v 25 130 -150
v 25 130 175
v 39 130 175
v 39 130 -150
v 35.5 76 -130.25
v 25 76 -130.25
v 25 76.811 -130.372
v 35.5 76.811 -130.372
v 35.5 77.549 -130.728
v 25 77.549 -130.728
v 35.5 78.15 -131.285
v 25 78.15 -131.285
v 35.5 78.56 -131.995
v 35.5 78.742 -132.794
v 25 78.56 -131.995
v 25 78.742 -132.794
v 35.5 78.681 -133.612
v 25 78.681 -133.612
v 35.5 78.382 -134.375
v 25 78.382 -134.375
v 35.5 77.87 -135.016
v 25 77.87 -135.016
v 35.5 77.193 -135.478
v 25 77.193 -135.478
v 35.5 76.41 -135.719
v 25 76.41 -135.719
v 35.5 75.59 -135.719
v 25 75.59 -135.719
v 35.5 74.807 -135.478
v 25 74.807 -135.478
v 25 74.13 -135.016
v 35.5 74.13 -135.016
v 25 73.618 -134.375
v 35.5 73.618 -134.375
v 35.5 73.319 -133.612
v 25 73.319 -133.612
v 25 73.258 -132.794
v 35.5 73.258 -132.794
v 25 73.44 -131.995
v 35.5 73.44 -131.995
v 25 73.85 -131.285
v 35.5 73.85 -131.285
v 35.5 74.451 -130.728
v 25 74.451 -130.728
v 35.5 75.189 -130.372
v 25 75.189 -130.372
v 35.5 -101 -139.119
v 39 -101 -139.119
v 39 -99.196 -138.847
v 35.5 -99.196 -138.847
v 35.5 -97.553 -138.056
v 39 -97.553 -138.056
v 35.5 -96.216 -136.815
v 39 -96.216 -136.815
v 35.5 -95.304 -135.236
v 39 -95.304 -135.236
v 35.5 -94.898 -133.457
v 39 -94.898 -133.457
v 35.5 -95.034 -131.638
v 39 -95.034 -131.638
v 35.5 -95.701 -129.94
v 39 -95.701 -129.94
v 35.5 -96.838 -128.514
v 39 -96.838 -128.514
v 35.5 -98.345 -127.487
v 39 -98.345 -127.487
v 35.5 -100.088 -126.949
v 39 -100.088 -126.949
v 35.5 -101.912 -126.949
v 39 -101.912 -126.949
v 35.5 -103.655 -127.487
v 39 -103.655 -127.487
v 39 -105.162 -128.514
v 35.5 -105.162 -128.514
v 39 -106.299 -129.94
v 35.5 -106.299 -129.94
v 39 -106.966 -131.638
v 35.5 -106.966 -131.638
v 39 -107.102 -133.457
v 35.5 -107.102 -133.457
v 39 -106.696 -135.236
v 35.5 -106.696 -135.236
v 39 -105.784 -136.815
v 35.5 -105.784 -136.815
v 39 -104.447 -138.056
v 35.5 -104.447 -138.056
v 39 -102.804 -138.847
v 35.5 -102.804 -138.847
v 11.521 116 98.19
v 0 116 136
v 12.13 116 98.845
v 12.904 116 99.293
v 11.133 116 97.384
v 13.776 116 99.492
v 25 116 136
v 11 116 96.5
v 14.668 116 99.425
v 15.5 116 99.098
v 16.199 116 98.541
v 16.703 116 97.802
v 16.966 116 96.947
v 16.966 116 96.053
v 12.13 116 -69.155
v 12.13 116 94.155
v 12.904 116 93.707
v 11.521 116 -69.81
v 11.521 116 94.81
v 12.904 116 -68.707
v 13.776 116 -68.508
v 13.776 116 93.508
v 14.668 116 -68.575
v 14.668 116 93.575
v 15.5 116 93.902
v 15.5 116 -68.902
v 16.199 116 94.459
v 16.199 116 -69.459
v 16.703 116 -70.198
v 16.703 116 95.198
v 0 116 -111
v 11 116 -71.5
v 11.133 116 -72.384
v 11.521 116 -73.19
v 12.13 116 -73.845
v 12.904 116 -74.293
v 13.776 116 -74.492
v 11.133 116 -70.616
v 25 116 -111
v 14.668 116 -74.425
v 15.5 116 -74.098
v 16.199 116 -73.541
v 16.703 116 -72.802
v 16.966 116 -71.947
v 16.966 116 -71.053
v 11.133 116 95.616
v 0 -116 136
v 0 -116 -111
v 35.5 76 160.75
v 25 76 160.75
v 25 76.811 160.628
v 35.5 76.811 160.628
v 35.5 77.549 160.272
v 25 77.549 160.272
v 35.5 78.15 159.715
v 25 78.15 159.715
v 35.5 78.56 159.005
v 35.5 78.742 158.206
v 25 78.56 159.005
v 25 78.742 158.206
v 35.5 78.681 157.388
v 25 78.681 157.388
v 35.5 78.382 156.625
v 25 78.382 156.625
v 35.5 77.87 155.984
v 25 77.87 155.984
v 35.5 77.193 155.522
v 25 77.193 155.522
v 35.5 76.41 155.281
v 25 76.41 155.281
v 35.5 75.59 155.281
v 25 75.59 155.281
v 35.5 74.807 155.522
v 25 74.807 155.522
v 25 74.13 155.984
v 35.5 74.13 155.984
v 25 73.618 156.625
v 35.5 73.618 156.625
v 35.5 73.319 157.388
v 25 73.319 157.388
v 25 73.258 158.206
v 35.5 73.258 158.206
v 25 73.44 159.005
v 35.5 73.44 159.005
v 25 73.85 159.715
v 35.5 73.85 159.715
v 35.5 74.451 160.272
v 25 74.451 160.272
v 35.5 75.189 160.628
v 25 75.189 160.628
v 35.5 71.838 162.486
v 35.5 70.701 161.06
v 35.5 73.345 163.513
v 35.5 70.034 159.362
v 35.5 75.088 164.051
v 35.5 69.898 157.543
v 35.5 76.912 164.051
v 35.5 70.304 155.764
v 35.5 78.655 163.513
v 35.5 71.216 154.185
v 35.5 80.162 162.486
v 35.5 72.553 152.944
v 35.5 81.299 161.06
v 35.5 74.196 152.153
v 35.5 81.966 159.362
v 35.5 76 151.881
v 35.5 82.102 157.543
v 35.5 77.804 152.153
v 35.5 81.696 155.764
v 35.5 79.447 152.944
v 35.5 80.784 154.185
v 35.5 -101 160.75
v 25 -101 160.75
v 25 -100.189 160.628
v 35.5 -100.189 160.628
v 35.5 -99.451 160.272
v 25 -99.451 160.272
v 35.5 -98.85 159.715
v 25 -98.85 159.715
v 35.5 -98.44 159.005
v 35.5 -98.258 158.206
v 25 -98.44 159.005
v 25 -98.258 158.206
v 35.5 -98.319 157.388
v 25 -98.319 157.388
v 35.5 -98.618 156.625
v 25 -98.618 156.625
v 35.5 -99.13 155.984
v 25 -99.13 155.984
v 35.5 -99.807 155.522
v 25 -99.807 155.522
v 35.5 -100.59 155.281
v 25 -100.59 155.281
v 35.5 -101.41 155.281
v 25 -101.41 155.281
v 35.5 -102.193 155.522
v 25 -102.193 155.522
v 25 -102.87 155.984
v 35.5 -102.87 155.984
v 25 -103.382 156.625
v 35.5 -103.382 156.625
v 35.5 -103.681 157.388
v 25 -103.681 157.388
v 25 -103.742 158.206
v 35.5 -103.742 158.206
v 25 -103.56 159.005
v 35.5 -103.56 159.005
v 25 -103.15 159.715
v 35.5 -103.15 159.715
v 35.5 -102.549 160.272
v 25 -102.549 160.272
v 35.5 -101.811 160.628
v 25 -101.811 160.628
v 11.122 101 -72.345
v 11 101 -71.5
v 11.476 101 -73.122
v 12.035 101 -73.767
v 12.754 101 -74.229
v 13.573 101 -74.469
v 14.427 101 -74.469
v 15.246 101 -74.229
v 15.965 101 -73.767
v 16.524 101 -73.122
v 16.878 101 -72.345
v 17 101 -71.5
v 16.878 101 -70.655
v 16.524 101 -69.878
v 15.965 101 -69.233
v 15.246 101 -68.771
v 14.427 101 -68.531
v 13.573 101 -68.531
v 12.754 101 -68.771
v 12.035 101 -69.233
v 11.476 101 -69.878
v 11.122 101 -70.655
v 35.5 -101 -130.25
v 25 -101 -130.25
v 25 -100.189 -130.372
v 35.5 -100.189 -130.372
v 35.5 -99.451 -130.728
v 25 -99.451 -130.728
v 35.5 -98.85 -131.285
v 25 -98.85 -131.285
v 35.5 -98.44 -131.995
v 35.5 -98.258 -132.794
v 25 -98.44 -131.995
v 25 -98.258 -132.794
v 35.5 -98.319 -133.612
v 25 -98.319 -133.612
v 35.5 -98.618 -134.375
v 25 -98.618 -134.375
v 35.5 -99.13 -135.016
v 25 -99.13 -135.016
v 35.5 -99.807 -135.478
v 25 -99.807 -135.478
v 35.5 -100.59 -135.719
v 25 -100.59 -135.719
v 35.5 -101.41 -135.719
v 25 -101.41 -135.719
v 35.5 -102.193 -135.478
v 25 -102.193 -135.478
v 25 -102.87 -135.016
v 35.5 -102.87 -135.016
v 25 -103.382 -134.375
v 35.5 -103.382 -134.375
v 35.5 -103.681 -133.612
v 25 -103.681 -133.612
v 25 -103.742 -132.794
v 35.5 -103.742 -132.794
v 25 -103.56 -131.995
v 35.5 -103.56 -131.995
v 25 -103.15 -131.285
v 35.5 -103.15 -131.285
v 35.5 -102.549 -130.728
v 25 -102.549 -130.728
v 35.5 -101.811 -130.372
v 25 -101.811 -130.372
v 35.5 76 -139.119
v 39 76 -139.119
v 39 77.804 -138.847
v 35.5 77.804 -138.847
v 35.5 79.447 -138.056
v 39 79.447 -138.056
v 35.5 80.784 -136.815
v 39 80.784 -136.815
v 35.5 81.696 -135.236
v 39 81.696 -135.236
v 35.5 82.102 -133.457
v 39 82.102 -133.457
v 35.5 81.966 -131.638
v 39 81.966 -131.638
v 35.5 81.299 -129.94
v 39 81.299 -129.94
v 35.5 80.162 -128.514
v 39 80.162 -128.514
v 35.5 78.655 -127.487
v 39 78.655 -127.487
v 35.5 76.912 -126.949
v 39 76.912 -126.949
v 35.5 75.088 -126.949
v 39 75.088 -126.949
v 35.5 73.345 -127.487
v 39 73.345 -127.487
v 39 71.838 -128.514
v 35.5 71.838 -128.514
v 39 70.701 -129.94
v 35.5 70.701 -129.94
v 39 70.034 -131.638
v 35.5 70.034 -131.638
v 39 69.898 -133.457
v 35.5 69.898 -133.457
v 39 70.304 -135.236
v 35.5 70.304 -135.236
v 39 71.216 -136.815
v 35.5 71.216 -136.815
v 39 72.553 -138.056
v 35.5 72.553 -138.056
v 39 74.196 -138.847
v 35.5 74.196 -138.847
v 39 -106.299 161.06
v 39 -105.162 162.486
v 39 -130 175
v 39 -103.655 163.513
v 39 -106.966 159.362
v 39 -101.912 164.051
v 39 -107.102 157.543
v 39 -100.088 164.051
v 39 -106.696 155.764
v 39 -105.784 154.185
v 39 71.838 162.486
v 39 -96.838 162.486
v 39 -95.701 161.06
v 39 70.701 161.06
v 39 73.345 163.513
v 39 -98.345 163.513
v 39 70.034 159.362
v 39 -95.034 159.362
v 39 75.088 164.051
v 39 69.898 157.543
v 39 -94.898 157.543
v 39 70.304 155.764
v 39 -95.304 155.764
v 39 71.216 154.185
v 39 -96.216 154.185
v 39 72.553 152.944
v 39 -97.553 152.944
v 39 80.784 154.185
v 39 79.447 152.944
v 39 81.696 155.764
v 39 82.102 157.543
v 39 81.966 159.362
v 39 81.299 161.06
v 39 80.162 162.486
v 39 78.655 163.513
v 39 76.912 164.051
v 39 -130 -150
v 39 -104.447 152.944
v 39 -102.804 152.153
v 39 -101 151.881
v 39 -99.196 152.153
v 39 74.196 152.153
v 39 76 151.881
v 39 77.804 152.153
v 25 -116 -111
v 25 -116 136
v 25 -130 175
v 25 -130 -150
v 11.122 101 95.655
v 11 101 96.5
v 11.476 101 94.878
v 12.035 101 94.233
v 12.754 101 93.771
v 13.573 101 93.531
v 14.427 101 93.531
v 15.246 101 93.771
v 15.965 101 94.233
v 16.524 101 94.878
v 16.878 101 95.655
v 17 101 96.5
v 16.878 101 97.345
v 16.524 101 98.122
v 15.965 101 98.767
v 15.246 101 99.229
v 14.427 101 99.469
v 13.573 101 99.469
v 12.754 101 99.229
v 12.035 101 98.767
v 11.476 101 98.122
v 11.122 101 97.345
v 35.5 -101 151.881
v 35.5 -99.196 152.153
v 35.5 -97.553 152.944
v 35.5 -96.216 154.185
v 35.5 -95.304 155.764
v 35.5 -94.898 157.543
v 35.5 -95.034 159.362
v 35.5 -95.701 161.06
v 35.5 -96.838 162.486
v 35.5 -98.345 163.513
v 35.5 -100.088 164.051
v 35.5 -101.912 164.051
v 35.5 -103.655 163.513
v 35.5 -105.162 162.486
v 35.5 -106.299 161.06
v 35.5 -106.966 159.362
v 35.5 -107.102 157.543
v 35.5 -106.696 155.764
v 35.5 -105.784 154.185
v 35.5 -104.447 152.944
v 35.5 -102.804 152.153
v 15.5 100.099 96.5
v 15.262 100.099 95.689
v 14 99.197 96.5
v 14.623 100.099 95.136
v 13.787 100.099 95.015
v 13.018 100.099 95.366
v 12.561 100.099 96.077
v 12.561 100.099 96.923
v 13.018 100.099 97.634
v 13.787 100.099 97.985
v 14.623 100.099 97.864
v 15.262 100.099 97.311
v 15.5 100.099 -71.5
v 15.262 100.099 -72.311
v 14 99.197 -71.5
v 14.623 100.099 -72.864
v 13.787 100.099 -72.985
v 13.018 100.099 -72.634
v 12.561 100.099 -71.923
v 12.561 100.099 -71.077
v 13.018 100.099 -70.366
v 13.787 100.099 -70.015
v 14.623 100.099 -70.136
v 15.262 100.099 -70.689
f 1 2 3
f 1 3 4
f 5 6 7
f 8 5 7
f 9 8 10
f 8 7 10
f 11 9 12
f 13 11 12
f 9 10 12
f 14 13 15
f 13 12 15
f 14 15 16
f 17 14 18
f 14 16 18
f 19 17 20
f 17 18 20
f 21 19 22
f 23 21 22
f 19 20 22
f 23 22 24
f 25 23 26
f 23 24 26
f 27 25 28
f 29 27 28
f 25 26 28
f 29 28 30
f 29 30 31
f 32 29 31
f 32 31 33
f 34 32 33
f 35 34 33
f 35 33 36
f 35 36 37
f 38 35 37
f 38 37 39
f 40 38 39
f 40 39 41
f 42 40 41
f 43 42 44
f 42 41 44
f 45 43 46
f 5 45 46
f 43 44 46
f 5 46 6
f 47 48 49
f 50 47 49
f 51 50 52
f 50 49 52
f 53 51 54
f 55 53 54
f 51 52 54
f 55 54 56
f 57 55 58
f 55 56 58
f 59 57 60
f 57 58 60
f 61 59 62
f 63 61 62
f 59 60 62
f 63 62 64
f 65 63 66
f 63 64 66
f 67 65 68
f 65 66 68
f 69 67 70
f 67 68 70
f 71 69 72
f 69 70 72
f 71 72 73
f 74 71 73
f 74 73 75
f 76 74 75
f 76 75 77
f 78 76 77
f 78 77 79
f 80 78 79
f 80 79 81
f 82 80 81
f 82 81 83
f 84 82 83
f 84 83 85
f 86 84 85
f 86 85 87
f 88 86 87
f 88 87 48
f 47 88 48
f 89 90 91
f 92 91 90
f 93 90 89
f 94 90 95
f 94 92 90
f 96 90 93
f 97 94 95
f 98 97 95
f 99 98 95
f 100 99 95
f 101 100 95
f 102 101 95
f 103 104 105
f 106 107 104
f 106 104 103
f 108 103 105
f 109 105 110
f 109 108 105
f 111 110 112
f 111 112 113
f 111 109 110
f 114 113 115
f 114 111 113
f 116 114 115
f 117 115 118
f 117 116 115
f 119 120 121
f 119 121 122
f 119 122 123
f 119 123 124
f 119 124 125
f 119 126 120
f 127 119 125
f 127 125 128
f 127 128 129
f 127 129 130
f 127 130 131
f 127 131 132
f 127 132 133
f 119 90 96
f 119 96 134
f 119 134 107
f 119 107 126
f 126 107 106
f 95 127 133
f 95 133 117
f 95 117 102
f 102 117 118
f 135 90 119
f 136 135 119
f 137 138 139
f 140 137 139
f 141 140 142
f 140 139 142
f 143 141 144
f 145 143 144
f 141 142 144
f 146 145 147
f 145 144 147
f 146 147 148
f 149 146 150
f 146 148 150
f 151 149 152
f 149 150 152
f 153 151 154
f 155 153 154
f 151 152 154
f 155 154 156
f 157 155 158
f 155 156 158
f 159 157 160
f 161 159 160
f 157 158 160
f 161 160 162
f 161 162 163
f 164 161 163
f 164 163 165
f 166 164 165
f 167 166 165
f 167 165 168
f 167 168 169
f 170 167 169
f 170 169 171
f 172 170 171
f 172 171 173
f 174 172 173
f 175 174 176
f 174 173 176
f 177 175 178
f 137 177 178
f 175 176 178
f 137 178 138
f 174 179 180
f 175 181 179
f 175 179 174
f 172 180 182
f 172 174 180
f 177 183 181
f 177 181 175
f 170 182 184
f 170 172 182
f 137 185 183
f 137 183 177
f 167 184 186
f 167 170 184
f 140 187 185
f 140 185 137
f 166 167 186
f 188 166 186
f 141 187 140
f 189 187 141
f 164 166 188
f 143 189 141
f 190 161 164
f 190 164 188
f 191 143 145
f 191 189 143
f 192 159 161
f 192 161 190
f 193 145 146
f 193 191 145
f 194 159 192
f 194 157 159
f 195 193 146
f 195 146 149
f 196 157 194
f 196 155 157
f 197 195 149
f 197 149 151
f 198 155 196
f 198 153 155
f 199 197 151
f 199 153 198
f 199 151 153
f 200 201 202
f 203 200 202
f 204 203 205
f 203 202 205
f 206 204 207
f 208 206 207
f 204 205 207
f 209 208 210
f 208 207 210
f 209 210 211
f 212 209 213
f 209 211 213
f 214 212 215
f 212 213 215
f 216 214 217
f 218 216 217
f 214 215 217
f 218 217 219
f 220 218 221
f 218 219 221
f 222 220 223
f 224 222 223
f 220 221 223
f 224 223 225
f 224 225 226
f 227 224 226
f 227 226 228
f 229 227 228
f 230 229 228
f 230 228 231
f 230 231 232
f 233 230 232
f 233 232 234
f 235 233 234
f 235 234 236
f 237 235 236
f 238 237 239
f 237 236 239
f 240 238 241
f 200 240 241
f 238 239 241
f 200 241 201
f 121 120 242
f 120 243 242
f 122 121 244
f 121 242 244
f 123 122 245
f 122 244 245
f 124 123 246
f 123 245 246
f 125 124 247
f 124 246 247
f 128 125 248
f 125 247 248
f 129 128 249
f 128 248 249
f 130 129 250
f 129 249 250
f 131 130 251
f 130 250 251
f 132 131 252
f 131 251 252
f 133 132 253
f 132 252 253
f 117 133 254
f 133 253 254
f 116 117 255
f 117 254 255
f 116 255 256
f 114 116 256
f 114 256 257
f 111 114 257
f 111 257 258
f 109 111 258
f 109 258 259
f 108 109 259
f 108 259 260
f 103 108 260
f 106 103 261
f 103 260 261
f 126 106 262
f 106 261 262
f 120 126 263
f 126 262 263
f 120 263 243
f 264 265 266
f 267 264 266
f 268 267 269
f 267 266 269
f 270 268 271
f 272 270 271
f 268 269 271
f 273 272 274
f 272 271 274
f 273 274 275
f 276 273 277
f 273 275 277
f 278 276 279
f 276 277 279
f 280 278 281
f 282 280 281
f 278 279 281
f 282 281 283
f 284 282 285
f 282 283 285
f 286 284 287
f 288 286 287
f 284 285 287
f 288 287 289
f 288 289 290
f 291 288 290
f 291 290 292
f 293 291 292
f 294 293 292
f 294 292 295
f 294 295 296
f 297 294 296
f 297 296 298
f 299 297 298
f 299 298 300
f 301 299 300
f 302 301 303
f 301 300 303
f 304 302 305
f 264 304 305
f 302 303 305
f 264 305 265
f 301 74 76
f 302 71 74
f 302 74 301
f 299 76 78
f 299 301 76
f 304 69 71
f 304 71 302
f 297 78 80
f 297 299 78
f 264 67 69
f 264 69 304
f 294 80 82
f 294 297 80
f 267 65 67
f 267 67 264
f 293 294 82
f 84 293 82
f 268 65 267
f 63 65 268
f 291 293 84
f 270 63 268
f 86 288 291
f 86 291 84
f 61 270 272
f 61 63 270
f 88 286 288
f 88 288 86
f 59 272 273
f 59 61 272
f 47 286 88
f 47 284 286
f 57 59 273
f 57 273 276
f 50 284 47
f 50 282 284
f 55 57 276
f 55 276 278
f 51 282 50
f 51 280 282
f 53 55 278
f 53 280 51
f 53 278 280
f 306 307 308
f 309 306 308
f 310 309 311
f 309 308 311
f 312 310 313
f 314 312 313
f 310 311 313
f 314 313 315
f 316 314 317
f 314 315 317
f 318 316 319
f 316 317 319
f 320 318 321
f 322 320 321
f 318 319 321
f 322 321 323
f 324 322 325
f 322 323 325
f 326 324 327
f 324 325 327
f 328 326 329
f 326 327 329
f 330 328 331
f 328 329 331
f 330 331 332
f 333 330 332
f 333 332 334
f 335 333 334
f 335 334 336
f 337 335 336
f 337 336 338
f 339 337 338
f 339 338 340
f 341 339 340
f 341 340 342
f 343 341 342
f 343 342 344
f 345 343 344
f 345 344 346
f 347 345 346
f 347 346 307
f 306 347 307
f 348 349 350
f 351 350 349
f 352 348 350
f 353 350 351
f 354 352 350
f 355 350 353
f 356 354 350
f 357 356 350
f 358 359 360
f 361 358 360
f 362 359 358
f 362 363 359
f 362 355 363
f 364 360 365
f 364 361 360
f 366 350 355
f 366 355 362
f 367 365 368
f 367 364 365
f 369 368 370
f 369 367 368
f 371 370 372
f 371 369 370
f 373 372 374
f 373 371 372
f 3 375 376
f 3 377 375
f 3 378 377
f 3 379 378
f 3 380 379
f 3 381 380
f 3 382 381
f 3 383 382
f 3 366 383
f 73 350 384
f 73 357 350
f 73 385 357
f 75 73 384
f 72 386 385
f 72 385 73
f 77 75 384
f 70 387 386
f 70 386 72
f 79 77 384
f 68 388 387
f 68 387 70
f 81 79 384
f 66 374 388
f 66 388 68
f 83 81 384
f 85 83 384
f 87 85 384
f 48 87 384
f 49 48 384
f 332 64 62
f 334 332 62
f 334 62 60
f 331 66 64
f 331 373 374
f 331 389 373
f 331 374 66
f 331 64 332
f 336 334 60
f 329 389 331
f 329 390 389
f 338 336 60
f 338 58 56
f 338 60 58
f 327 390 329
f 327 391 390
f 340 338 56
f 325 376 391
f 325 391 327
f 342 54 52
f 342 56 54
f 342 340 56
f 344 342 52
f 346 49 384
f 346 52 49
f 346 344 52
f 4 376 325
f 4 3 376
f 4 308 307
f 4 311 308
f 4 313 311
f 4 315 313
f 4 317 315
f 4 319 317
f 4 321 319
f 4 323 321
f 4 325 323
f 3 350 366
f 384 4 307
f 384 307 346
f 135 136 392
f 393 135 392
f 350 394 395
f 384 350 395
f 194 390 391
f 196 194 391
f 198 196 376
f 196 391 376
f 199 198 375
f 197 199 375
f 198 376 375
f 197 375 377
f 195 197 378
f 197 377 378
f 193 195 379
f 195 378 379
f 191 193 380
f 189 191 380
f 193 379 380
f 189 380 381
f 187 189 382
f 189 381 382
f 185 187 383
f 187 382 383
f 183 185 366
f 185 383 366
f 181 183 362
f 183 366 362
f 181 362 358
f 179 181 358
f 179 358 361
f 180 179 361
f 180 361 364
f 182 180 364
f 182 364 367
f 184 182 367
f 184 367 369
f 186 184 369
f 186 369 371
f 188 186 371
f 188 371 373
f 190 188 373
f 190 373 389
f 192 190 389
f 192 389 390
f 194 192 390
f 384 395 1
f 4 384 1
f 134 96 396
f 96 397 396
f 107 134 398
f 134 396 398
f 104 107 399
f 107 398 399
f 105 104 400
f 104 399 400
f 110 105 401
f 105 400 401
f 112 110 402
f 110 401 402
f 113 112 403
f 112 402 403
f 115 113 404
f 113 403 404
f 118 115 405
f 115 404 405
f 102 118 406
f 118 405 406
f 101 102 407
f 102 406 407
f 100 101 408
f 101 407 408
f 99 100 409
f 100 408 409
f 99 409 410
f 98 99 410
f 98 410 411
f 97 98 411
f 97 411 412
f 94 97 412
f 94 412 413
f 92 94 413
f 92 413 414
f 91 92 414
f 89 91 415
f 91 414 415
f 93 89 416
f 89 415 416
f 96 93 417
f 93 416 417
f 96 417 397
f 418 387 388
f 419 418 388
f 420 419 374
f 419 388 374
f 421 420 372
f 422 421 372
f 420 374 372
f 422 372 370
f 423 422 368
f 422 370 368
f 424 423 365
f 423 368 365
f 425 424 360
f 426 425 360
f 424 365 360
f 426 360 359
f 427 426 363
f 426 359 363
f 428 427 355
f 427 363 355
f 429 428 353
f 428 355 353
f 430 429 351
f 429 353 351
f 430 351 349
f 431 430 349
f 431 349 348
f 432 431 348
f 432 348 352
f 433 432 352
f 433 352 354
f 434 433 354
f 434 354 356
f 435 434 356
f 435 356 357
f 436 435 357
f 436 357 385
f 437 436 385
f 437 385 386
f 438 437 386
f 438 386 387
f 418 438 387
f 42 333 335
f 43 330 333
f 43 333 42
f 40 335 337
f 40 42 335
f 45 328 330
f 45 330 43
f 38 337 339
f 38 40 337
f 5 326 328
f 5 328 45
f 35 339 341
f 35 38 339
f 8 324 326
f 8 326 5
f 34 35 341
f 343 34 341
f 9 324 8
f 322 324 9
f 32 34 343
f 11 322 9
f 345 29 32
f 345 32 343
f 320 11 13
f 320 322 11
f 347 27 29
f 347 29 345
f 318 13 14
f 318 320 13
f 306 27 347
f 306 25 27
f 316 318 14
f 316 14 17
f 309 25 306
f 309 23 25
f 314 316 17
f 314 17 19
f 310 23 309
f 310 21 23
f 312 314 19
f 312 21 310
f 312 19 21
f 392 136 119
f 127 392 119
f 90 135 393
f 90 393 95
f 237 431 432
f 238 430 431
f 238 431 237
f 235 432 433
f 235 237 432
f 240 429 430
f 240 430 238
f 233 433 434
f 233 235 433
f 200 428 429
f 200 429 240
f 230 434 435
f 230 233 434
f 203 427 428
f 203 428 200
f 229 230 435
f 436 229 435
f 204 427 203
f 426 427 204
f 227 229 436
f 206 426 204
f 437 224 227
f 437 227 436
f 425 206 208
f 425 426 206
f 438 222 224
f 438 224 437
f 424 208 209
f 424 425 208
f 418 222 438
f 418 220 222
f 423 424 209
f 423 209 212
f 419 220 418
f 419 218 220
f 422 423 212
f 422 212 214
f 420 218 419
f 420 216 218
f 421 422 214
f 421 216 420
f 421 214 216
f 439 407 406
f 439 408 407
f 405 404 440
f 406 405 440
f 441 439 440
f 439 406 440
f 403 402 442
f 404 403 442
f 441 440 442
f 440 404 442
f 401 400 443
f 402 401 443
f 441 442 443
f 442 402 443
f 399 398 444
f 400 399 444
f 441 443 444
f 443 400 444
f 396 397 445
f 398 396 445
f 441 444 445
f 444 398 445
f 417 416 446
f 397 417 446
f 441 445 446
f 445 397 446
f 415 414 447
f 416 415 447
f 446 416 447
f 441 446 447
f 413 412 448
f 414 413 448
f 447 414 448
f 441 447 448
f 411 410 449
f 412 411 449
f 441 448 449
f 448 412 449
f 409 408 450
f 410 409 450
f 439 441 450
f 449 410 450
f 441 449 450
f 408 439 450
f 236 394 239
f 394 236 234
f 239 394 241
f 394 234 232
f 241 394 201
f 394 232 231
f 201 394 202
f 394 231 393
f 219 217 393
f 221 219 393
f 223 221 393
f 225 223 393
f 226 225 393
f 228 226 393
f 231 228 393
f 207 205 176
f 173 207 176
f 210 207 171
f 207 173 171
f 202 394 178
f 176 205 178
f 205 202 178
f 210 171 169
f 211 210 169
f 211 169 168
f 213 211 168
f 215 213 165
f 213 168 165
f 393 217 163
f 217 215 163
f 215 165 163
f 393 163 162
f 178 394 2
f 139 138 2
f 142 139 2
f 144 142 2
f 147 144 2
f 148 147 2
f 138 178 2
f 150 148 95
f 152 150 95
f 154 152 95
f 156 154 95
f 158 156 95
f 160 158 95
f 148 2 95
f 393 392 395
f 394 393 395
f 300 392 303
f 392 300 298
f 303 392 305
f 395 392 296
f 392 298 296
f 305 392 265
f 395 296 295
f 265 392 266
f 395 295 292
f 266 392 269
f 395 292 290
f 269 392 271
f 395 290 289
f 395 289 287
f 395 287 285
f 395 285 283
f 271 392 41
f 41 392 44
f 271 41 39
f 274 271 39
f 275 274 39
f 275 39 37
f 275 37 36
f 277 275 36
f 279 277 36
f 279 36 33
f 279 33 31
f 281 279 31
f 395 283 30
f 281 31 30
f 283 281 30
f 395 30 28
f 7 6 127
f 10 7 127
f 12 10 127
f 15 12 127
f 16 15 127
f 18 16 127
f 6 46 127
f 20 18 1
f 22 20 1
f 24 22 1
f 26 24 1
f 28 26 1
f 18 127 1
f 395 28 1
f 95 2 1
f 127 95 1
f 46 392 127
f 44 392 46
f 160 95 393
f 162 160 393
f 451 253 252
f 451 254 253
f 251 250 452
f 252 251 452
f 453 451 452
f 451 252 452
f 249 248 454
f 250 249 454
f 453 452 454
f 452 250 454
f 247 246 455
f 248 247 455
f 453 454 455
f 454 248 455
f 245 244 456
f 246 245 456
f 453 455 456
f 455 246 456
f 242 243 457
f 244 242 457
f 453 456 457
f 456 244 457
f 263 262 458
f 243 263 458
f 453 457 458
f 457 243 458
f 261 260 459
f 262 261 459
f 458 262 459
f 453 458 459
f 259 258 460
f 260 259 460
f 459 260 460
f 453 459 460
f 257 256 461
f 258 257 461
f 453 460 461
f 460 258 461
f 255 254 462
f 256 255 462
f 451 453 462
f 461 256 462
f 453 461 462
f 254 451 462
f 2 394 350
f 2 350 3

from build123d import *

# Parameters (mm, degrees)
SKETCH1_W                               = 325
SKETCH1_H                               = 260
BOSS_EXTRUDE1_DEPTH                     = 39
CBORE_FOR_M5_HEX_HEAD_BOLT1_D           = 5.5
CBORE_FOR_M5_HEX_HEAD_BOLT1_DEPTH       = 30
CBORE_FOR_M5_HEX_HEAD_BOLT1_CBORE_D     = 12.238
CBORE_FOR_M5_HEX_HEAD_BOLT1_CBORE_DEPTH = 3.5
CBORE_FOR_M5_HEX_HEAD_BOLT1_TIP         = 1.652366702
SKETCH10_W                              = 39
SKETCH10_H                              = 260
CUT_EXTRUDE2_DEPTH                      = 25
SKETCH11_W                              = 25
SKETCH11_H                              = 247
CUT_EXTRUDE3_DEPTH                      = 14
F_6_0MM_DOWEL_HOLE1_D                   = 6
F_6_0MM_DOWEL_HOLE1_DEPTH               = 15
F_6_0MM_DOWEL_HOLE1_TIP                 = 1.802581857
CUT_EXTRUDE4_DEPTH                      = 222.463315247
CUT_EXTRUDE4_DEPTH_BACK                 = 222.463315247
SKETCH15_W                              = 25
SKETCH15_H                              = 14


with BuildPart() as part:
    # Sketch1 → Boss-Extrude1 (new body)
    with BuildSketch(Plane(origin=(0, 0, 0), x_dir=(0, 0, -1), z_dir=(1, 0, 0))):
        with Locations((-12.5, 0)):
            Rectangle(SKETCH1_W, SKETCH1_H)
    extrude(amount=BOSS_EXTRUDE1_DEPTH)

    # CBORE for M5 Hex Head Bolt1
    with Locations(Plane(origin=(39, 0, 0), x_dir=(0, 0, -1), z_dir=(1, 0, 0))):
        with Locations((133, -101), (133, 76), (-158, 76), (-158, -101)):
            CounterBoreHole(CBORE_FOR_M5_HEX_HEAD_BOLT1_D / 2, CBORE_FOR_M5_HEX_HEAD_BOLT1_CBORE_D / 2, CBORE_FOR_M5_HEX_HEAD_BOLT1_CBORE_DEPTH, depth=CBORE_FOR_M5_HEX_HEAD_BOLT1_DEPTH)
            with Locations((0, 0, -(CBORE_FOR_M5_HEX_HEAD_BOLT1_DEPTH + CBORE_FOR_M5_HEX_HEAD_BOLT1_TIP / 2))):  # 118° drill point
                Cone(0, CBORE_FOR_M5_HEX_HEAD_BOLT1_D / 2, CBORE_FOR_M5_HEX_HEAD_BOLT1_TIP, mode=Mode.SUBTRACT)

    # Sketch10 → Cut-Extrude2 (cut)
    with BuildSketch(Plane(origin=(0, 0, 0), x_dir=(0, 0, -1), z_dir=(1, 0, 0))):
        with Locations((130.5, 0)):
            Rectangle(SKETCH10_W, SKETCH10_H)
        with Locations((-155.5, 0)):
            Rectangle(SKETCH10_W, SKETCH10_H)
    extrude(amount=CUT_EXTRUDE2_DEPTH, mode=Mode.SUBTRACT)

    # Sketch11 → Cut-Extrude3 (cut)
    with BuildSketch(Plane(origin=(0, 130, 0), x_dir=(1, 0, 0), z_dir=(0, 1, 0))):
        with Locations((12.5, -12.5)):
            Rectangle(SKETCH11_W, SKETCH11_H)
    extrude(amount=-CUT_EXTRUDE3_DEPTH, mode=Mode.SUBTRACT)

    # Ø6.0mm Dowel Hole1
    with Locations(Plane(origin=(0, 116, 0), x_dir=(1, 0, 0), z_dir=(0, 1, 0))):
        with Locations((14, 71.5), (14, -96.5)):
            Hole(F_6_0MM_DOWEL_HOLE1_D / 2, depth=F_6_0MM_DOWEL_HOLE1_DEPTH)
            with Locations((0, 0, -(F_6_0MM_DOWEL_HOLE1_DEPTH + F_6_0MM_DOWEL_HOLE1_TIP / 2))):  # 118° drill point
                Cone(0, F_6_0MM_DOWEL_HOLE1_D / 2, F_6_0MM_DOWEL_HOLE1_TIP, mode=Mode.SUBTRACT)

    # Sketch15 → Cut-Extrude4 (cut, two sides: drawn at the far end of the back side and taken through both)
    with BuildSketch(Plane.XY.offset(-CUT_EXTRUDE4_DEPTH_BACK)):
        with Locations((12.5, -123)):
            Rectangle(SKETCH15_W, SKETCH15_H)
    extrude(amount=CUT_EXTRUDE4_DEPTH + CUT_EXTRUDE4_DEPTH_BACK, mode=Mode.SUBTRACT)


solid = part.part
